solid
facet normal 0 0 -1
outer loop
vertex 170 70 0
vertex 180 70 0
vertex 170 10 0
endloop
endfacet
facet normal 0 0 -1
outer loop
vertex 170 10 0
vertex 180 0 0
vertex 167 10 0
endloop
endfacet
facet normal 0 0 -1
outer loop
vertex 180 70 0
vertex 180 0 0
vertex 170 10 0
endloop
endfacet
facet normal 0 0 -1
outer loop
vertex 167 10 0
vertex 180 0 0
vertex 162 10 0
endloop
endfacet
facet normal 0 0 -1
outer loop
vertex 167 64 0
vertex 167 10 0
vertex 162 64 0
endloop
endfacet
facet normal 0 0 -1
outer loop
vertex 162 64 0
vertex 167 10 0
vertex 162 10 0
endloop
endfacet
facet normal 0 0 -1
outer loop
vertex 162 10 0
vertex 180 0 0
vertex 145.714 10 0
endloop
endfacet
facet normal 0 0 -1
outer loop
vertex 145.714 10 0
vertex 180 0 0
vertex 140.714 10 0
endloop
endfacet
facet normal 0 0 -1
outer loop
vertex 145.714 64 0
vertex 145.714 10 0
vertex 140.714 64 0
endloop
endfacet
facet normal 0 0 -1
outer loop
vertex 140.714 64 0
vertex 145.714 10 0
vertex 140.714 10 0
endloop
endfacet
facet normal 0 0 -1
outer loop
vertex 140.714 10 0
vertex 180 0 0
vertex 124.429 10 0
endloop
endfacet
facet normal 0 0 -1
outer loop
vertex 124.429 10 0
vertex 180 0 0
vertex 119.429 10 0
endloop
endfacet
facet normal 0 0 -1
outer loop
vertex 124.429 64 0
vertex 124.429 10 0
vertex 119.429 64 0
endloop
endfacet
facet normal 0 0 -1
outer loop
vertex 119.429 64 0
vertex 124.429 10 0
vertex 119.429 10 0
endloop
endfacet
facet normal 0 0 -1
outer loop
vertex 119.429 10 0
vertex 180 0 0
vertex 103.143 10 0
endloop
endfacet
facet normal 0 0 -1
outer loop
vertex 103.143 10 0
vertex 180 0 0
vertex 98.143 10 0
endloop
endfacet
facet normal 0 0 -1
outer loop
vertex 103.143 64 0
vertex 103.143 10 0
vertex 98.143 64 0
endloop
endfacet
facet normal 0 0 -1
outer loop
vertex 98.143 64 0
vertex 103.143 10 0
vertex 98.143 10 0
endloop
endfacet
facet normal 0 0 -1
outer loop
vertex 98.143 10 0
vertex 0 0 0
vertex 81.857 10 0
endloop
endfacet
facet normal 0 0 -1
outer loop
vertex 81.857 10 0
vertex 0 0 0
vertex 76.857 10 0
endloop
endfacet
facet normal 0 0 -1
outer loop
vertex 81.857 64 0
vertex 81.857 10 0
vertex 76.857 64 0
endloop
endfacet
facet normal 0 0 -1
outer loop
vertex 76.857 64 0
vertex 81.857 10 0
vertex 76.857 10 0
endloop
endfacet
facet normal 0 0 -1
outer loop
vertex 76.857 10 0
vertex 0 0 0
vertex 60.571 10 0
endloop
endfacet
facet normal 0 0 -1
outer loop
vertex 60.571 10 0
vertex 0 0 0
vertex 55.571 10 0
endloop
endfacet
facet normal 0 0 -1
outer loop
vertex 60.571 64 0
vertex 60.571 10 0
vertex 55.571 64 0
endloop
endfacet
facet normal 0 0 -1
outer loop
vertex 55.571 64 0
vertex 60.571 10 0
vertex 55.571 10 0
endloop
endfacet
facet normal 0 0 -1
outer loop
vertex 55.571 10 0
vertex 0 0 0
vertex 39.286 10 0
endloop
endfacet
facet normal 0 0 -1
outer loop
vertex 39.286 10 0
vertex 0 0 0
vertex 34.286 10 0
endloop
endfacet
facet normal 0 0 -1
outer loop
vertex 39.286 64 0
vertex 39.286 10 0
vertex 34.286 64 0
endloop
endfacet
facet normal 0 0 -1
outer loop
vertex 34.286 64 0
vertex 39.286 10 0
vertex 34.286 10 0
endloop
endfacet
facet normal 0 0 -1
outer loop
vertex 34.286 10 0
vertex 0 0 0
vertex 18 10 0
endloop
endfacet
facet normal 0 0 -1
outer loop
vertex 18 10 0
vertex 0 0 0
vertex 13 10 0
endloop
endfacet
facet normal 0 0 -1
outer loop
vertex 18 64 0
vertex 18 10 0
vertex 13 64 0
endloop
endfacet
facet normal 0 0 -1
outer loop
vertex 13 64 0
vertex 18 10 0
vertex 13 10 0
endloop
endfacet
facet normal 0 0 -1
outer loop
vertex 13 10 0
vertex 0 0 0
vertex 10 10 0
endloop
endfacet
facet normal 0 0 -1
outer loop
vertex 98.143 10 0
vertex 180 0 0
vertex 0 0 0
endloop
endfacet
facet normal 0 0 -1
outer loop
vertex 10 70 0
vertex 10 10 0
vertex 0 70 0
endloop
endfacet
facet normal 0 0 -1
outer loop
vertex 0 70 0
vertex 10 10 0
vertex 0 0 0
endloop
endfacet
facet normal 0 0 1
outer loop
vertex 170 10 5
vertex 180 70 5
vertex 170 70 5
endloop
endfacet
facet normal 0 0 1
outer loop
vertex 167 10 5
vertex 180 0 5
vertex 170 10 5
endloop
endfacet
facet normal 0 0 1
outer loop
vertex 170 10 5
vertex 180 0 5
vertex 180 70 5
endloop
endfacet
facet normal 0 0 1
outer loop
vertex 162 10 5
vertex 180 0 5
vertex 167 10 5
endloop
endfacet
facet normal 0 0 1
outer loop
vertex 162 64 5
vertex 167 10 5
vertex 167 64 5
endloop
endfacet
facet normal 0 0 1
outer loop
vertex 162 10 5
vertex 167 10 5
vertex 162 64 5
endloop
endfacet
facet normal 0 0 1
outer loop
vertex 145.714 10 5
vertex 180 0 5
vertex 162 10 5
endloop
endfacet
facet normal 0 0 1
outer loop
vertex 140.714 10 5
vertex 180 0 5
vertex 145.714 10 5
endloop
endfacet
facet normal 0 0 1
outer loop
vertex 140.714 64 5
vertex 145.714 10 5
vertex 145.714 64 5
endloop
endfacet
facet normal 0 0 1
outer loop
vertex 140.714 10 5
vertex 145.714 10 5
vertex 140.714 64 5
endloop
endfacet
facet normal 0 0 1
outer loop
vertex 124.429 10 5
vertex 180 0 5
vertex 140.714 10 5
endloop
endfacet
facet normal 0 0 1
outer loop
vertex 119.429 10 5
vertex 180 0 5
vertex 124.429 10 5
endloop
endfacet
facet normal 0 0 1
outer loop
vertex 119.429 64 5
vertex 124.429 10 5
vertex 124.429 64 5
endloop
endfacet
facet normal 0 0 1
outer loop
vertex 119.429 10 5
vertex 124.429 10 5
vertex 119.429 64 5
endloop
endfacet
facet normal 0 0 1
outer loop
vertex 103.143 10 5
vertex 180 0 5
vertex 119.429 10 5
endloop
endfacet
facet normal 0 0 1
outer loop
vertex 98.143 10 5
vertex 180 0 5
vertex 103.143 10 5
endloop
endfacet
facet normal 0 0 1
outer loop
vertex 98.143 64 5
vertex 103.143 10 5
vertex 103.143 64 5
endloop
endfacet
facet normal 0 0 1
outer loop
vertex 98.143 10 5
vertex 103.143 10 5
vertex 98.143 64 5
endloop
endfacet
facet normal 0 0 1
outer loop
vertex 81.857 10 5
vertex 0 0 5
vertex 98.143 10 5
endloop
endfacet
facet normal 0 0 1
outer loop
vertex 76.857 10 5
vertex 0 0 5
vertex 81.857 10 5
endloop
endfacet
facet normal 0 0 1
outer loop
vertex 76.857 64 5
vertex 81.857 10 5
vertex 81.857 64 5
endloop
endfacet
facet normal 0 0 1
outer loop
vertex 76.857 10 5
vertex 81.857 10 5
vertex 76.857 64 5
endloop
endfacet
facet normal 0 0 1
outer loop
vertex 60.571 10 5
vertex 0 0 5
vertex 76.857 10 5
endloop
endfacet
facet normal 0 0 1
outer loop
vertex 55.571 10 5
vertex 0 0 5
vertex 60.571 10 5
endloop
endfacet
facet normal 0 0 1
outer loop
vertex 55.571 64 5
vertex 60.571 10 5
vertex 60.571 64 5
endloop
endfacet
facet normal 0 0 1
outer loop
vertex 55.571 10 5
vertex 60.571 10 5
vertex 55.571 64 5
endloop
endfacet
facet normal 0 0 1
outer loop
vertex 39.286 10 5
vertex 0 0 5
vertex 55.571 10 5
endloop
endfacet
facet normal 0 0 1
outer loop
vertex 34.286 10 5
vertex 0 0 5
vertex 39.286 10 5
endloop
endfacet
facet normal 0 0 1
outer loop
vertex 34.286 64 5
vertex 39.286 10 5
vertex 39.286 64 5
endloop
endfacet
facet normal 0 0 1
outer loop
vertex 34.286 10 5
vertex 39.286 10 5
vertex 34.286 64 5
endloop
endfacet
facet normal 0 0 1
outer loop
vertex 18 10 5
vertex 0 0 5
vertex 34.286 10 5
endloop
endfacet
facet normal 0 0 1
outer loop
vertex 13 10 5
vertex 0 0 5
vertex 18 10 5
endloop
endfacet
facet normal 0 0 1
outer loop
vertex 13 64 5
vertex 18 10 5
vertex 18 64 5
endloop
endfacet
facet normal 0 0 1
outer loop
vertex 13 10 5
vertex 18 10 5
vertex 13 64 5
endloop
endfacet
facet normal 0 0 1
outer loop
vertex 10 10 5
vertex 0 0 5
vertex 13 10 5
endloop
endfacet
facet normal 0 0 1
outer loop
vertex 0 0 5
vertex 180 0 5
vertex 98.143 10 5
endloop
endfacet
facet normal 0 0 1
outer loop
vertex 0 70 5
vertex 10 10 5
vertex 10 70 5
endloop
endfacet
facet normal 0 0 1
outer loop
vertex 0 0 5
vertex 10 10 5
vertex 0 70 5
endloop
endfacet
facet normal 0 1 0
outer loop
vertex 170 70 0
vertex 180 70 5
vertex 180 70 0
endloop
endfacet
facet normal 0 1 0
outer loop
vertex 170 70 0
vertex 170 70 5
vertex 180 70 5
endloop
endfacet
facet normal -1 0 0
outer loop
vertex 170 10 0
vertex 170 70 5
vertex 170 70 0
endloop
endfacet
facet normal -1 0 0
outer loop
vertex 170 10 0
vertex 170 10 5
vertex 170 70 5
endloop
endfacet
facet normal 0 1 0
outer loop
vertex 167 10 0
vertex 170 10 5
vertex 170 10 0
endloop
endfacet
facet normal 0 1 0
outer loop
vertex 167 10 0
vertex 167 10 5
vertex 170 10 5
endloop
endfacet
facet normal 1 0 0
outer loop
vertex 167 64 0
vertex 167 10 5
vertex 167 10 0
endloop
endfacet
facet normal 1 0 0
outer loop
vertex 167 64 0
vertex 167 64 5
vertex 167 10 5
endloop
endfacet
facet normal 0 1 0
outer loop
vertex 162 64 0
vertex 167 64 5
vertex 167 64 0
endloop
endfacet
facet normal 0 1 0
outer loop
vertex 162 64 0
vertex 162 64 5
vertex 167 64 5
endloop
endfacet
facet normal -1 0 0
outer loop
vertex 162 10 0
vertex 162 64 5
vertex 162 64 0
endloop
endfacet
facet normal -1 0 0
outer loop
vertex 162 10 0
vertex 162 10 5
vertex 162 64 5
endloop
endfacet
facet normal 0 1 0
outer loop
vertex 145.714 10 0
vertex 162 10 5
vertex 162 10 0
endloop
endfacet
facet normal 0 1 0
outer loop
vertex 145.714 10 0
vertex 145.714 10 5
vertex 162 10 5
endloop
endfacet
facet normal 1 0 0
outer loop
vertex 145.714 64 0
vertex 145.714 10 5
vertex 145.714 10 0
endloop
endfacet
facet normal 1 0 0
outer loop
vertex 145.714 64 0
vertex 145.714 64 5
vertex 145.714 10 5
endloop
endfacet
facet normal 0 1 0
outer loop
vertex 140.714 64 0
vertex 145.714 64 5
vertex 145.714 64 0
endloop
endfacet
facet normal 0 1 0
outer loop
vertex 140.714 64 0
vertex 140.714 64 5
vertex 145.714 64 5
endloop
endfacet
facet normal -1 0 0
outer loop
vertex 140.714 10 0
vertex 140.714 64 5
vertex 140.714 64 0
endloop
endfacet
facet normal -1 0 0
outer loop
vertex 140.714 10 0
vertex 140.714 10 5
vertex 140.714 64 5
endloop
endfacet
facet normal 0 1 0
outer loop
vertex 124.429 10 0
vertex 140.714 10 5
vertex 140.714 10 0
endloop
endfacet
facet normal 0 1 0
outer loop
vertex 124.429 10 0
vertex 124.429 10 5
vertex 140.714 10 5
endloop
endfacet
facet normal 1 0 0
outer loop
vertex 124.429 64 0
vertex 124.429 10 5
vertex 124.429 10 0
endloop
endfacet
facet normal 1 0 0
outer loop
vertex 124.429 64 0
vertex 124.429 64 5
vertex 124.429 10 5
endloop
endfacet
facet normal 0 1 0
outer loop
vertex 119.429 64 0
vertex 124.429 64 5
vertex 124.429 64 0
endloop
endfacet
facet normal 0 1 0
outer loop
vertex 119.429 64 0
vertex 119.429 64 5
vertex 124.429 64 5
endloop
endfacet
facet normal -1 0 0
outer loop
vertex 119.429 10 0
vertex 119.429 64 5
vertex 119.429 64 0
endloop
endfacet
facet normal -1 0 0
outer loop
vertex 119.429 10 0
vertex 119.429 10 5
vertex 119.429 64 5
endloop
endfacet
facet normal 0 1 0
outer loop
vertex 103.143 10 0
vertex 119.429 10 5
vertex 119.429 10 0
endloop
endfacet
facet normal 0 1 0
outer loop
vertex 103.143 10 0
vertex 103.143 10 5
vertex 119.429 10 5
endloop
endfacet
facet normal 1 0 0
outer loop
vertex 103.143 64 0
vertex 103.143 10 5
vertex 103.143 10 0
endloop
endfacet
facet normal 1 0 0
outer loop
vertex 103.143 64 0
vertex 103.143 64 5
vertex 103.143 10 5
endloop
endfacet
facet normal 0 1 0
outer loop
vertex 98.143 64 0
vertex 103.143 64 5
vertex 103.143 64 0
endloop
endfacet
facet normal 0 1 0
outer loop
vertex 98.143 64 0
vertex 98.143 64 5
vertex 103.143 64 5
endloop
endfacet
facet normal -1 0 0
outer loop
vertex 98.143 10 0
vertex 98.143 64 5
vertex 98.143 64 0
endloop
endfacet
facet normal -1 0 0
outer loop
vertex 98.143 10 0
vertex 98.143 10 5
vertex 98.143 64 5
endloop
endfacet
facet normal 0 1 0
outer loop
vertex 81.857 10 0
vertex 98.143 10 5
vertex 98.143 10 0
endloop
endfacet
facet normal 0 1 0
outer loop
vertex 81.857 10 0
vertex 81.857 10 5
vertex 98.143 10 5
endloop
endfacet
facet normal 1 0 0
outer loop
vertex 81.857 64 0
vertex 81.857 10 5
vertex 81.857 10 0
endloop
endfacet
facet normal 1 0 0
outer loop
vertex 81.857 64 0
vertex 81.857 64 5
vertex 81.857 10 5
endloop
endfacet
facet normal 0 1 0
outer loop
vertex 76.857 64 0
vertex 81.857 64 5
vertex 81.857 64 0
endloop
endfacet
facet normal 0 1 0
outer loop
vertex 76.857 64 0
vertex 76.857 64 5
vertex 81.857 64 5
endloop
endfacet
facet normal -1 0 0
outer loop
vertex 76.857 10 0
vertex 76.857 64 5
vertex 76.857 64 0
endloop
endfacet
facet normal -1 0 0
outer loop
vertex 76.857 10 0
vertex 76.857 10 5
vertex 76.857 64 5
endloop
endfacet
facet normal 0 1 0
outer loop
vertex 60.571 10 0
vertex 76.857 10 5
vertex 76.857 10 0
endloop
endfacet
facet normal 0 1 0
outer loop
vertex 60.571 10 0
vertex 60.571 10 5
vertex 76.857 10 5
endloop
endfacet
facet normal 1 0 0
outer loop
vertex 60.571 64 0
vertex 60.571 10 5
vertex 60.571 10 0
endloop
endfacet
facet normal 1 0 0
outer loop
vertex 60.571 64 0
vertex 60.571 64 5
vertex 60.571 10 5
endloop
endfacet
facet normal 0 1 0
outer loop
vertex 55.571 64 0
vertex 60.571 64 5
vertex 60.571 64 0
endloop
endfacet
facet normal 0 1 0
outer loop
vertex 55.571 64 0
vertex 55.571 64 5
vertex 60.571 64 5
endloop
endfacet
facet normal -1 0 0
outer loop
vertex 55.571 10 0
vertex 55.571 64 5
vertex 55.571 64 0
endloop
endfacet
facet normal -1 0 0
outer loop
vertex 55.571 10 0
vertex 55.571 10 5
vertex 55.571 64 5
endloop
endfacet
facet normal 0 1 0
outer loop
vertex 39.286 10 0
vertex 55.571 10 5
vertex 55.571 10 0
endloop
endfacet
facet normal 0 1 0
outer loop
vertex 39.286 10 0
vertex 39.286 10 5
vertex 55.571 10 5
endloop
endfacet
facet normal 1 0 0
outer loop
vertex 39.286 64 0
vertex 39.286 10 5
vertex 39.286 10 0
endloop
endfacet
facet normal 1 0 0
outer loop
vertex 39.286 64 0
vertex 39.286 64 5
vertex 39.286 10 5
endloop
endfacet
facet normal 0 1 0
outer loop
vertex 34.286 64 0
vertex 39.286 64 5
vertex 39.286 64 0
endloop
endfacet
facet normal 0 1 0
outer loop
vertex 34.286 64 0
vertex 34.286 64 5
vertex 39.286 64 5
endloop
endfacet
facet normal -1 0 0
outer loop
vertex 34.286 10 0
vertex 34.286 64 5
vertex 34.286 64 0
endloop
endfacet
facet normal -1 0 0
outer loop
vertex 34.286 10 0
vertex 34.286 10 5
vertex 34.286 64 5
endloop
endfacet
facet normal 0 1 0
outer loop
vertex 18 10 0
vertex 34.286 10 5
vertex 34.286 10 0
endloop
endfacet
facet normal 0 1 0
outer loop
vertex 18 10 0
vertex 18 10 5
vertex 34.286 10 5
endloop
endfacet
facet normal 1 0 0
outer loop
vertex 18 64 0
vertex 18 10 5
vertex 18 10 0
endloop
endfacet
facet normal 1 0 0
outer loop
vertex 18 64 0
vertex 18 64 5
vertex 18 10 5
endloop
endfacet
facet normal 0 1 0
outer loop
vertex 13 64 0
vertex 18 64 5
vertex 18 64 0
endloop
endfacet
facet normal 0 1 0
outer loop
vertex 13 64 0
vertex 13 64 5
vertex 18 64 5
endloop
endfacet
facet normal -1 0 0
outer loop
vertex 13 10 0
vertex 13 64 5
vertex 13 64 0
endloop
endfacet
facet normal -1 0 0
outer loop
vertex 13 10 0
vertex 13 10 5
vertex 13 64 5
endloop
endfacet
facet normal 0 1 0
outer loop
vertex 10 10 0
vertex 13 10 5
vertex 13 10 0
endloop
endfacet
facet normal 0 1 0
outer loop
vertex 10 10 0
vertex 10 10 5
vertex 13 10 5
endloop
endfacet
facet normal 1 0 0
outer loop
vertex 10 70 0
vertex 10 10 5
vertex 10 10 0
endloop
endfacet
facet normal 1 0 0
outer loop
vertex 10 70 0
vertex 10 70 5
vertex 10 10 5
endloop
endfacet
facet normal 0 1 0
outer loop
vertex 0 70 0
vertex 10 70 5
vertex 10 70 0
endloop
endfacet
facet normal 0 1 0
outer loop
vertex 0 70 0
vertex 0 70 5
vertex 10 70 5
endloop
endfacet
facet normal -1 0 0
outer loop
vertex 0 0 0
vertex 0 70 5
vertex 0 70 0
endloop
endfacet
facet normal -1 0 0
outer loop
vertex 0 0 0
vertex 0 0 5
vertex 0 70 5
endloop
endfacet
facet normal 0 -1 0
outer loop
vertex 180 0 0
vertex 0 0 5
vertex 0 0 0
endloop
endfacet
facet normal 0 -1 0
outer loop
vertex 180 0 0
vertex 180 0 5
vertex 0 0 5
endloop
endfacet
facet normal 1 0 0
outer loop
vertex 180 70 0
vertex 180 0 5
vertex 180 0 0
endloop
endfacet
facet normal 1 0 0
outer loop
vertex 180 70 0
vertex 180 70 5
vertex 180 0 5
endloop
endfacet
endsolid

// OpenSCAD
$fn = 32;

// ----------------------------------------------------------------------
// Guard grille: 8 slats over a 180 x 70 mm plate
// ----------------------------------------------------------------------

// --- parameters (mm) ---
profile_height = 5;       // extrusion height
profile_points = 40;      // points of the closed outline

profile = [[0, 0], [180, 0], [180, 70], [170, 70], [170, 10], [167, 10], [167, 64], [162, 64], [162, 10], [145.714, 10], [145.714, 64], [140.714, 64], [140.714, 10], [124.429, 10], [124.429, 64], [119.429, 64], [119.429, 10], [103.143, 10], [103.143, 64], [98.143, 64], [98.143, 10], [81.857, 10], [81.857, 64], [76.857, 64], [76.857, 10], [60.571, 10], [60.571, 64], [55.571, 64], [55.571, 10], [39.286, 10], [39.286, 64], [34.286, 64], [34.286, 10], [18, 10], [18, 64], [13, 64], [13, 10], [10, 10], [10, 70], [0, 70]];  // single closed polygon, 40 points, counter clockwise

// --- the one profile operation ---
linear_extrude(height = profile_height) polygon(points = profile);
